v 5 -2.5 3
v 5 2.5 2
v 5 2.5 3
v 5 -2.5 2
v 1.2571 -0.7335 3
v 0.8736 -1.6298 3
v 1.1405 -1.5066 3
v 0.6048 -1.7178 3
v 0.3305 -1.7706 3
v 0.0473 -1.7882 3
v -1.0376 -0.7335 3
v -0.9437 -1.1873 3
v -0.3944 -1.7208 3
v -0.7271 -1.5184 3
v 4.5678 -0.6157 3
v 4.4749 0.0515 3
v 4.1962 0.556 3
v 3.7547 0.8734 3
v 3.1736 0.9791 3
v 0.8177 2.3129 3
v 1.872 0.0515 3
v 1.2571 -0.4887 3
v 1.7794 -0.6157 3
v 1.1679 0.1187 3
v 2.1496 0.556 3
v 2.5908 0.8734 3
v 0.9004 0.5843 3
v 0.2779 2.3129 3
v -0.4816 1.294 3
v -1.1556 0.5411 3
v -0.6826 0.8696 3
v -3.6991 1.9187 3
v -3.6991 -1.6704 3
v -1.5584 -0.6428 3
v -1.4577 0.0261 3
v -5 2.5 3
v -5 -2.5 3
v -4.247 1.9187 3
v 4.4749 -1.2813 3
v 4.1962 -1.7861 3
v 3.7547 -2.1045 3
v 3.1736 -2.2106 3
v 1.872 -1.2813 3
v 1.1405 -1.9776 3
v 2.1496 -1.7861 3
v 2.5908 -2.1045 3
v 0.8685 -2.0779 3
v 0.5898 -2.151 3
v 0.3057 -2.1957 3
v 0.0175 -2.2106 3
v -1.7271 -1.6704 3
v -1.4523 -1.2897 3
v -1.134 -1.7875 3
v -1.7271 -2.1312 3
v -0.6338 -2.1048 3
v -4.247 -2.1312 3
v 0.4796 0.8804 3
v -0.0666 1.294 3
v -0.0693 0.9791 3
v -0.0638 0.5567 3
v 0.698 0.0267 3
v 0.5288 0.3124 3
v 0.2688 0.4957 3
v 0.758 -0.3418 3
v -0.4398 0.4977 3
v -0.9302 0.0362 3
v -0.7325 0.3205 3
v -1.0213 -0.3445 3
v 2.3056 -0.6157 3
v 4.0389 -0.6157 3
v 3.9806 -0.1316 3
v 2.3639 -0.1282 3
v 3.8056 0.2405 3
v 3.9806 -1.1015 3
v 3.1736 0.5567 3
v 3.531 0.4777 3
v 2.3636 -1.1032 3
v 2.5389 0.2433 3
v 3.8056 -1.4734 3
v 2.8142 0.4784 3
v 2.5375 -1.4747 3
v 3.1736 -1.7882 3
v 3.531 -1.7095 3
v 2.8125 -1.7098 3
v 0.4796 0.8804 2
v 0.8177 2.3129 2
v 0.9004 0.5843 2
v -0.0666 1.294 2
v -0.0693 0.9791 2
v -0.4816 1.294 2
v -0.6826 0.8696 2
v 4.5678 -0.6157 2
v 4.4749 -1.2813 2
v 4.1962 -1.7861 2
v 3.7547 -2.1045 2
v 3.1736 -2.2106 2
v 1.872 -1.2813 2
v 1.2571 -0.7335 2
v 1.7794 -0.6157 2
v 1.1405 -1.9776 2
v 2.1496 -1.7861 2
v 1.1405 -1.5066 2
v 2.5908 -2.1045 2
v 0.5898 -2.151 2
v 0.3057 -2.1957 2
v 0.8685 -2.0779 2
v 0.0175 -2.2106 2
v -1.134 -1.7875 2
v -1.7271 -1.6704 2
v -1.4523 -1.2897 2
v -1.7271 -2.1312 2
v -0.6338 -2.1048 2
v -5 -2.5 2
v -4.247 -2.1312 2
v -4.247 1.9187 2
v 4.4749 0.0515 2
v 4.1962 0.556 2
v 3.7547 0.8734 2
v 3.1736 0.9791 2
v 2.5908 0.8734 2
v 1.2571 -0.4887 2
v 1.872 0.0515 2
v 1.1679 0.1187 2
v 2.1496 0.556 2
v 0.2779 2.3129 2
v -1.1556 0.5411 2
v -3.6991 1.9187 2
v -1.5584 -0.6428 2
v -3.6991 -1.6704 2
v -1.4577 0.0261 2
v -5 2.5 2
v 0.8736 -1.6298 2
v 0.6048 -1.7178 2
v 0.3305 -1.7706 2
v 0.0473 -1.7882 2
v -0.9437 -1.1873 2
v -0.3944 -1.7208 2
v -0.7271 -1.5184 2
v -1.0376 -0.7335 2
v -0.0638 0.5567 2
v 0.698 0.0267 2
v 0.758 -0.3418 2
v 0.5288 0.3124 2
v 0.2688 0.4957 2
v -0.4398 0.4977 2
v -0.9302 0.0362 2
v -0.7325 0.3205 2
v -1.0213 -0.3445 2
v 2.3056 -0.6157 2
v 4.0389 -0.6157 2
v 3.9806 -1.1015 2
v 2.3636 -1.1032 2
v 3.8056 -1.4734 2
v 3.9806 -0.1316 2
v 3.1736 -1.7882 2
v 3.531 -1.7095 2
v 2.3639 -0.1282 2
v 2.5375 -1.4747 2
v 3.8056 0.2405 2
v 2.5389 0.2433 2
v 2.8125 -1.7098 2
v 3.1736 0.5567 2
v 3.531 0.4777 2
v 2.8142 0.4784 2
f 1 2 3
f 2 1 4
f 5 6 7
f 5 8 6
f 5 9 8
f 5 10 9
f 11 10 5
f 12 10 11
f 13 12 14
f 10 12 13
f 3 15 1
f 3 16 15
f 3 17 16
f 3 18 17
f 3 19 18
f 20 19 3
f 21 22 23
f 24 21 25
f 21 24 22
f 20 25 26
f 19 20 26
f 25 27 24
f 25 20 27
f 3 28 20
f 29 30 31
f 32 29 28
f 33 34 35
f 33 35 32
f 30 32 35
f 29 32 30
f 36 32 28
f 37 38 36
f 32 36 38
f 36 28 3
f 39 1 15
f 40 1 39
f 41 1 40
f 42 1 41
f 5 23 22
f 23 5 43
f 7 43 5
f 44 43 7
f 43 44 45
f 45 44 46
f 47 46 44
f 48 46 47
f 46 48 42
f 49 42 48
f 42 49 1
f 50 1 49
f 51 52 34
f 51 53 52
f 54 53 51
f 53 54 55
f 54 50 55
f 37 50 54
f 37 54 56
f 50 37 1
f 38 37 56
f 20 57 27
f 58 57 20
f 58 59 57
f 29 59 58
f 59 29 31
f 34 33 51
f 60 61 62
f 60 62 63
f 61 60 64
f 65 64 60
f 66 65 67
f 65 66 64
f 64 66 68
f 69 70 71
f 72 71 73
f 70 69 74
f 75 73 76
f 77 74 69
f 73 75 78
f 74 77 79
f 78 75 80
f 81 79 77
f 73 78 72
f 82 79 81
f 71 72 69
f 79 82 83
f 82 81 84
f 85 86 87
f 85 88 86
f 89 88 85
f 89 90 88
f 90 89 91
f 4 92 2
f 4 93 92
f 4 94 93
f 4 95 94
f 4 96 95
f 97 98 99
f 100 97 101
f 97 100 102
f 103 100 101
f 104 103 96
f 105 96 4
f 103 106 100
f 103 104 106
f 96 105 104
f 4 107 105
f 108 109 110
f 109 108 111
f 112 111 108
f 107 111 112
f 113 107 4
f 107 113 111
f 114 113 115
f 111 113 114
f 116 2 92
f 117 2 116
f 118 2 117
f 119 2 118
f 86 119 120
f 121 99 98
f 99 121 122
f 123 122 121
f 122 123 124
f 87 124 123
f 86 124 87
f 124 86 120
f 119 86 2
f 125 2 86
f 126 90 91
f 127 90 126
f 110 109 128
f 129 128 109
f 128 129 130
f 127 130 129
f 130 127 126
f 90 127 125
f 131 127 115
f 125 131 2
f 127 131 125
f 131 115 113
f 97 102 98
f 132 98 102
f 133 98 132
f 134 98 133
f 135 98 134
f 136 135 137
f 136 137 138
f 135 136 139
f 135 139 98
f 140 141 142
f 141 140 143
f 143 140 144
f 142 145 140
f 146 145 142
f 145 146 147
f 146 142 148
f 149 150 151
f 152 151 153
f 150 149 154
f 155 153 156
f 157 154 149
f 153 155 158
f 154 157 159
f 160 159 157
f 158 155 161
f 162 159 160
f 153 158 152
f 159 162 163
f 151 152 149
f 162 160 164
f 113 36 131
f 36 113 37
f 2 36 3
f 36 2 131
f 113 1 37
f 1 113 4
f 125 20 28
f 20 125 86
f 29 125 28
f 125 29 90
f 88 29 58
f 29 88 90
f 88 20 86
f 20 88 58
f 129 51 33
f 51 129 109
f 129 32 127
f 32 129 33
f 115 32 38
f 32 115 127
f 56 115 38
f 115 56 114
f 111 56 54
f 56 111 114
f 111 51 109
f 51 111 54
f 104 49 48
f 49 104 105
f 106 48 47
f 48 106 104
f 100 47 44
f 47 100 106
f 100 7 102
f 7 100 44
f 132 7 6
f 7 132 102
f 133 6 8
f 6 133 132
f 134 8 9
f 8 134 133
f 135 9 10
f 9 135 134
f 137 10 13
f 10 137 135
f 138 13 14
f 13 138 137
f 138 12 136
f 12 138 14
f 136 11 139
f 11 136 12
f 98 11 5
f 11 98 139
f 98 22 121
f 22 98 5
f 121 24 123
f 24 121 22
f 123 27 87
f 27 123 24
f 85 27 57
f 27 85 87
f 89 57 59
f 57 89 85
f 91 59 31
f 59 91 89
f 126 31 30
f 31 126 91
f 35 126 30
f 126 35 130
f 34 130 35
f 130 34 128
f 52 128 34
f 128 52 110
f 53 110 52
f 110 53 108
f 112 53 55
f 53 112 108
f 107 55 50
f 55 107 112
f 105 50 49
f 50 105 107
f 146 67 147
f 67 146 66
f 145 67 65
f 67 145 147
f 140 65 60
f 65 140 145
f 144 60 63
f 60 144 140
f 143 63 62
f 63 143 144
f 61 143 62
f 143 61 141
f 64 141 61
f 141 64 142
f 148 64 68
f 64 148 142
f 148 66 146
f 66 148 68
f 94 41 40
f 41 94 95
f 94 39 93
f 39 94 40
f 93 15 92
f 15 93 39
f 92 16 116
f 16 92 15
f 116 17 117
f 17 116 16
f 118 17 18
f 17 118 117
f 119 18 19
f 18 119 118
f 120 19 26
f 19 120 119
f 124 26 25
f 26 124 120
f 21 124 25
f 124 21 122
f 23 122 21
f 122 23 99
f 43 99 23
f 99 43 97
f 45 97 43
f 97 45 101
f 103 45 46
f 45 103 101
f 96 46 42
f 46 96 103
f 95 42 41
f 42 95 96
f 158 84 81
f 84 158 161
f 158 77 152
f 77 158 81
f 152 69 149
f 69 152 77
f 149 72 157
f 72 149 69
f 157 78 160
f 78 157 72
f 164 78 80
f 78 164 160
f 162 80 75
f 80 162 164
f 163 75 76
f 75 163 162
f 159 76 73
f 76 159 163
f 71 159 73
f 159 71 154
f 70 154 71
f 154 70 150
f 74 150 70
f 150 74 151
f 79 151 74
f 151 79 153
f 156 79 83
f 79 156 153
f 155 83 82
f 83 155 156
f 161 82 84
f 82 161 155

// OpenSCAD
// Instanciation du module
bloc_lettre("Léo");

// Définition du module.
// size = 600 définit un paramètre optionnel avec une valeur par défaut.

module bloc_lettre(letter, taille=10) 
{
 union()
  {
   difference() 
   {      
        difference() 
        {
            translate([0,0,taille/4]) cube([10,5,taille/10], center=true);
            translate([0,0,taille/6]) 
            {

              // une convexité est nécessaire pour un aperçu correct 
              // puisque les caractères peuvent être très concave
                linear_extrude(height=taille, convexity=4)
                    text(letter, 
                         size=taille*4/10,
                         font="Bitstream Vera Sans",
                         halign="center",
                         valign="center");
            }
                   
        }
    
        translate ([-10.7,0,0]) cylinder (r1=0, r2=0.4, h=5, $fn=100, center=true);
         translate ([10.7,0,0]) cylinder (r1=0, r2=0.4, h=5, $fn=100, center=true);
   
    }
   }
}
